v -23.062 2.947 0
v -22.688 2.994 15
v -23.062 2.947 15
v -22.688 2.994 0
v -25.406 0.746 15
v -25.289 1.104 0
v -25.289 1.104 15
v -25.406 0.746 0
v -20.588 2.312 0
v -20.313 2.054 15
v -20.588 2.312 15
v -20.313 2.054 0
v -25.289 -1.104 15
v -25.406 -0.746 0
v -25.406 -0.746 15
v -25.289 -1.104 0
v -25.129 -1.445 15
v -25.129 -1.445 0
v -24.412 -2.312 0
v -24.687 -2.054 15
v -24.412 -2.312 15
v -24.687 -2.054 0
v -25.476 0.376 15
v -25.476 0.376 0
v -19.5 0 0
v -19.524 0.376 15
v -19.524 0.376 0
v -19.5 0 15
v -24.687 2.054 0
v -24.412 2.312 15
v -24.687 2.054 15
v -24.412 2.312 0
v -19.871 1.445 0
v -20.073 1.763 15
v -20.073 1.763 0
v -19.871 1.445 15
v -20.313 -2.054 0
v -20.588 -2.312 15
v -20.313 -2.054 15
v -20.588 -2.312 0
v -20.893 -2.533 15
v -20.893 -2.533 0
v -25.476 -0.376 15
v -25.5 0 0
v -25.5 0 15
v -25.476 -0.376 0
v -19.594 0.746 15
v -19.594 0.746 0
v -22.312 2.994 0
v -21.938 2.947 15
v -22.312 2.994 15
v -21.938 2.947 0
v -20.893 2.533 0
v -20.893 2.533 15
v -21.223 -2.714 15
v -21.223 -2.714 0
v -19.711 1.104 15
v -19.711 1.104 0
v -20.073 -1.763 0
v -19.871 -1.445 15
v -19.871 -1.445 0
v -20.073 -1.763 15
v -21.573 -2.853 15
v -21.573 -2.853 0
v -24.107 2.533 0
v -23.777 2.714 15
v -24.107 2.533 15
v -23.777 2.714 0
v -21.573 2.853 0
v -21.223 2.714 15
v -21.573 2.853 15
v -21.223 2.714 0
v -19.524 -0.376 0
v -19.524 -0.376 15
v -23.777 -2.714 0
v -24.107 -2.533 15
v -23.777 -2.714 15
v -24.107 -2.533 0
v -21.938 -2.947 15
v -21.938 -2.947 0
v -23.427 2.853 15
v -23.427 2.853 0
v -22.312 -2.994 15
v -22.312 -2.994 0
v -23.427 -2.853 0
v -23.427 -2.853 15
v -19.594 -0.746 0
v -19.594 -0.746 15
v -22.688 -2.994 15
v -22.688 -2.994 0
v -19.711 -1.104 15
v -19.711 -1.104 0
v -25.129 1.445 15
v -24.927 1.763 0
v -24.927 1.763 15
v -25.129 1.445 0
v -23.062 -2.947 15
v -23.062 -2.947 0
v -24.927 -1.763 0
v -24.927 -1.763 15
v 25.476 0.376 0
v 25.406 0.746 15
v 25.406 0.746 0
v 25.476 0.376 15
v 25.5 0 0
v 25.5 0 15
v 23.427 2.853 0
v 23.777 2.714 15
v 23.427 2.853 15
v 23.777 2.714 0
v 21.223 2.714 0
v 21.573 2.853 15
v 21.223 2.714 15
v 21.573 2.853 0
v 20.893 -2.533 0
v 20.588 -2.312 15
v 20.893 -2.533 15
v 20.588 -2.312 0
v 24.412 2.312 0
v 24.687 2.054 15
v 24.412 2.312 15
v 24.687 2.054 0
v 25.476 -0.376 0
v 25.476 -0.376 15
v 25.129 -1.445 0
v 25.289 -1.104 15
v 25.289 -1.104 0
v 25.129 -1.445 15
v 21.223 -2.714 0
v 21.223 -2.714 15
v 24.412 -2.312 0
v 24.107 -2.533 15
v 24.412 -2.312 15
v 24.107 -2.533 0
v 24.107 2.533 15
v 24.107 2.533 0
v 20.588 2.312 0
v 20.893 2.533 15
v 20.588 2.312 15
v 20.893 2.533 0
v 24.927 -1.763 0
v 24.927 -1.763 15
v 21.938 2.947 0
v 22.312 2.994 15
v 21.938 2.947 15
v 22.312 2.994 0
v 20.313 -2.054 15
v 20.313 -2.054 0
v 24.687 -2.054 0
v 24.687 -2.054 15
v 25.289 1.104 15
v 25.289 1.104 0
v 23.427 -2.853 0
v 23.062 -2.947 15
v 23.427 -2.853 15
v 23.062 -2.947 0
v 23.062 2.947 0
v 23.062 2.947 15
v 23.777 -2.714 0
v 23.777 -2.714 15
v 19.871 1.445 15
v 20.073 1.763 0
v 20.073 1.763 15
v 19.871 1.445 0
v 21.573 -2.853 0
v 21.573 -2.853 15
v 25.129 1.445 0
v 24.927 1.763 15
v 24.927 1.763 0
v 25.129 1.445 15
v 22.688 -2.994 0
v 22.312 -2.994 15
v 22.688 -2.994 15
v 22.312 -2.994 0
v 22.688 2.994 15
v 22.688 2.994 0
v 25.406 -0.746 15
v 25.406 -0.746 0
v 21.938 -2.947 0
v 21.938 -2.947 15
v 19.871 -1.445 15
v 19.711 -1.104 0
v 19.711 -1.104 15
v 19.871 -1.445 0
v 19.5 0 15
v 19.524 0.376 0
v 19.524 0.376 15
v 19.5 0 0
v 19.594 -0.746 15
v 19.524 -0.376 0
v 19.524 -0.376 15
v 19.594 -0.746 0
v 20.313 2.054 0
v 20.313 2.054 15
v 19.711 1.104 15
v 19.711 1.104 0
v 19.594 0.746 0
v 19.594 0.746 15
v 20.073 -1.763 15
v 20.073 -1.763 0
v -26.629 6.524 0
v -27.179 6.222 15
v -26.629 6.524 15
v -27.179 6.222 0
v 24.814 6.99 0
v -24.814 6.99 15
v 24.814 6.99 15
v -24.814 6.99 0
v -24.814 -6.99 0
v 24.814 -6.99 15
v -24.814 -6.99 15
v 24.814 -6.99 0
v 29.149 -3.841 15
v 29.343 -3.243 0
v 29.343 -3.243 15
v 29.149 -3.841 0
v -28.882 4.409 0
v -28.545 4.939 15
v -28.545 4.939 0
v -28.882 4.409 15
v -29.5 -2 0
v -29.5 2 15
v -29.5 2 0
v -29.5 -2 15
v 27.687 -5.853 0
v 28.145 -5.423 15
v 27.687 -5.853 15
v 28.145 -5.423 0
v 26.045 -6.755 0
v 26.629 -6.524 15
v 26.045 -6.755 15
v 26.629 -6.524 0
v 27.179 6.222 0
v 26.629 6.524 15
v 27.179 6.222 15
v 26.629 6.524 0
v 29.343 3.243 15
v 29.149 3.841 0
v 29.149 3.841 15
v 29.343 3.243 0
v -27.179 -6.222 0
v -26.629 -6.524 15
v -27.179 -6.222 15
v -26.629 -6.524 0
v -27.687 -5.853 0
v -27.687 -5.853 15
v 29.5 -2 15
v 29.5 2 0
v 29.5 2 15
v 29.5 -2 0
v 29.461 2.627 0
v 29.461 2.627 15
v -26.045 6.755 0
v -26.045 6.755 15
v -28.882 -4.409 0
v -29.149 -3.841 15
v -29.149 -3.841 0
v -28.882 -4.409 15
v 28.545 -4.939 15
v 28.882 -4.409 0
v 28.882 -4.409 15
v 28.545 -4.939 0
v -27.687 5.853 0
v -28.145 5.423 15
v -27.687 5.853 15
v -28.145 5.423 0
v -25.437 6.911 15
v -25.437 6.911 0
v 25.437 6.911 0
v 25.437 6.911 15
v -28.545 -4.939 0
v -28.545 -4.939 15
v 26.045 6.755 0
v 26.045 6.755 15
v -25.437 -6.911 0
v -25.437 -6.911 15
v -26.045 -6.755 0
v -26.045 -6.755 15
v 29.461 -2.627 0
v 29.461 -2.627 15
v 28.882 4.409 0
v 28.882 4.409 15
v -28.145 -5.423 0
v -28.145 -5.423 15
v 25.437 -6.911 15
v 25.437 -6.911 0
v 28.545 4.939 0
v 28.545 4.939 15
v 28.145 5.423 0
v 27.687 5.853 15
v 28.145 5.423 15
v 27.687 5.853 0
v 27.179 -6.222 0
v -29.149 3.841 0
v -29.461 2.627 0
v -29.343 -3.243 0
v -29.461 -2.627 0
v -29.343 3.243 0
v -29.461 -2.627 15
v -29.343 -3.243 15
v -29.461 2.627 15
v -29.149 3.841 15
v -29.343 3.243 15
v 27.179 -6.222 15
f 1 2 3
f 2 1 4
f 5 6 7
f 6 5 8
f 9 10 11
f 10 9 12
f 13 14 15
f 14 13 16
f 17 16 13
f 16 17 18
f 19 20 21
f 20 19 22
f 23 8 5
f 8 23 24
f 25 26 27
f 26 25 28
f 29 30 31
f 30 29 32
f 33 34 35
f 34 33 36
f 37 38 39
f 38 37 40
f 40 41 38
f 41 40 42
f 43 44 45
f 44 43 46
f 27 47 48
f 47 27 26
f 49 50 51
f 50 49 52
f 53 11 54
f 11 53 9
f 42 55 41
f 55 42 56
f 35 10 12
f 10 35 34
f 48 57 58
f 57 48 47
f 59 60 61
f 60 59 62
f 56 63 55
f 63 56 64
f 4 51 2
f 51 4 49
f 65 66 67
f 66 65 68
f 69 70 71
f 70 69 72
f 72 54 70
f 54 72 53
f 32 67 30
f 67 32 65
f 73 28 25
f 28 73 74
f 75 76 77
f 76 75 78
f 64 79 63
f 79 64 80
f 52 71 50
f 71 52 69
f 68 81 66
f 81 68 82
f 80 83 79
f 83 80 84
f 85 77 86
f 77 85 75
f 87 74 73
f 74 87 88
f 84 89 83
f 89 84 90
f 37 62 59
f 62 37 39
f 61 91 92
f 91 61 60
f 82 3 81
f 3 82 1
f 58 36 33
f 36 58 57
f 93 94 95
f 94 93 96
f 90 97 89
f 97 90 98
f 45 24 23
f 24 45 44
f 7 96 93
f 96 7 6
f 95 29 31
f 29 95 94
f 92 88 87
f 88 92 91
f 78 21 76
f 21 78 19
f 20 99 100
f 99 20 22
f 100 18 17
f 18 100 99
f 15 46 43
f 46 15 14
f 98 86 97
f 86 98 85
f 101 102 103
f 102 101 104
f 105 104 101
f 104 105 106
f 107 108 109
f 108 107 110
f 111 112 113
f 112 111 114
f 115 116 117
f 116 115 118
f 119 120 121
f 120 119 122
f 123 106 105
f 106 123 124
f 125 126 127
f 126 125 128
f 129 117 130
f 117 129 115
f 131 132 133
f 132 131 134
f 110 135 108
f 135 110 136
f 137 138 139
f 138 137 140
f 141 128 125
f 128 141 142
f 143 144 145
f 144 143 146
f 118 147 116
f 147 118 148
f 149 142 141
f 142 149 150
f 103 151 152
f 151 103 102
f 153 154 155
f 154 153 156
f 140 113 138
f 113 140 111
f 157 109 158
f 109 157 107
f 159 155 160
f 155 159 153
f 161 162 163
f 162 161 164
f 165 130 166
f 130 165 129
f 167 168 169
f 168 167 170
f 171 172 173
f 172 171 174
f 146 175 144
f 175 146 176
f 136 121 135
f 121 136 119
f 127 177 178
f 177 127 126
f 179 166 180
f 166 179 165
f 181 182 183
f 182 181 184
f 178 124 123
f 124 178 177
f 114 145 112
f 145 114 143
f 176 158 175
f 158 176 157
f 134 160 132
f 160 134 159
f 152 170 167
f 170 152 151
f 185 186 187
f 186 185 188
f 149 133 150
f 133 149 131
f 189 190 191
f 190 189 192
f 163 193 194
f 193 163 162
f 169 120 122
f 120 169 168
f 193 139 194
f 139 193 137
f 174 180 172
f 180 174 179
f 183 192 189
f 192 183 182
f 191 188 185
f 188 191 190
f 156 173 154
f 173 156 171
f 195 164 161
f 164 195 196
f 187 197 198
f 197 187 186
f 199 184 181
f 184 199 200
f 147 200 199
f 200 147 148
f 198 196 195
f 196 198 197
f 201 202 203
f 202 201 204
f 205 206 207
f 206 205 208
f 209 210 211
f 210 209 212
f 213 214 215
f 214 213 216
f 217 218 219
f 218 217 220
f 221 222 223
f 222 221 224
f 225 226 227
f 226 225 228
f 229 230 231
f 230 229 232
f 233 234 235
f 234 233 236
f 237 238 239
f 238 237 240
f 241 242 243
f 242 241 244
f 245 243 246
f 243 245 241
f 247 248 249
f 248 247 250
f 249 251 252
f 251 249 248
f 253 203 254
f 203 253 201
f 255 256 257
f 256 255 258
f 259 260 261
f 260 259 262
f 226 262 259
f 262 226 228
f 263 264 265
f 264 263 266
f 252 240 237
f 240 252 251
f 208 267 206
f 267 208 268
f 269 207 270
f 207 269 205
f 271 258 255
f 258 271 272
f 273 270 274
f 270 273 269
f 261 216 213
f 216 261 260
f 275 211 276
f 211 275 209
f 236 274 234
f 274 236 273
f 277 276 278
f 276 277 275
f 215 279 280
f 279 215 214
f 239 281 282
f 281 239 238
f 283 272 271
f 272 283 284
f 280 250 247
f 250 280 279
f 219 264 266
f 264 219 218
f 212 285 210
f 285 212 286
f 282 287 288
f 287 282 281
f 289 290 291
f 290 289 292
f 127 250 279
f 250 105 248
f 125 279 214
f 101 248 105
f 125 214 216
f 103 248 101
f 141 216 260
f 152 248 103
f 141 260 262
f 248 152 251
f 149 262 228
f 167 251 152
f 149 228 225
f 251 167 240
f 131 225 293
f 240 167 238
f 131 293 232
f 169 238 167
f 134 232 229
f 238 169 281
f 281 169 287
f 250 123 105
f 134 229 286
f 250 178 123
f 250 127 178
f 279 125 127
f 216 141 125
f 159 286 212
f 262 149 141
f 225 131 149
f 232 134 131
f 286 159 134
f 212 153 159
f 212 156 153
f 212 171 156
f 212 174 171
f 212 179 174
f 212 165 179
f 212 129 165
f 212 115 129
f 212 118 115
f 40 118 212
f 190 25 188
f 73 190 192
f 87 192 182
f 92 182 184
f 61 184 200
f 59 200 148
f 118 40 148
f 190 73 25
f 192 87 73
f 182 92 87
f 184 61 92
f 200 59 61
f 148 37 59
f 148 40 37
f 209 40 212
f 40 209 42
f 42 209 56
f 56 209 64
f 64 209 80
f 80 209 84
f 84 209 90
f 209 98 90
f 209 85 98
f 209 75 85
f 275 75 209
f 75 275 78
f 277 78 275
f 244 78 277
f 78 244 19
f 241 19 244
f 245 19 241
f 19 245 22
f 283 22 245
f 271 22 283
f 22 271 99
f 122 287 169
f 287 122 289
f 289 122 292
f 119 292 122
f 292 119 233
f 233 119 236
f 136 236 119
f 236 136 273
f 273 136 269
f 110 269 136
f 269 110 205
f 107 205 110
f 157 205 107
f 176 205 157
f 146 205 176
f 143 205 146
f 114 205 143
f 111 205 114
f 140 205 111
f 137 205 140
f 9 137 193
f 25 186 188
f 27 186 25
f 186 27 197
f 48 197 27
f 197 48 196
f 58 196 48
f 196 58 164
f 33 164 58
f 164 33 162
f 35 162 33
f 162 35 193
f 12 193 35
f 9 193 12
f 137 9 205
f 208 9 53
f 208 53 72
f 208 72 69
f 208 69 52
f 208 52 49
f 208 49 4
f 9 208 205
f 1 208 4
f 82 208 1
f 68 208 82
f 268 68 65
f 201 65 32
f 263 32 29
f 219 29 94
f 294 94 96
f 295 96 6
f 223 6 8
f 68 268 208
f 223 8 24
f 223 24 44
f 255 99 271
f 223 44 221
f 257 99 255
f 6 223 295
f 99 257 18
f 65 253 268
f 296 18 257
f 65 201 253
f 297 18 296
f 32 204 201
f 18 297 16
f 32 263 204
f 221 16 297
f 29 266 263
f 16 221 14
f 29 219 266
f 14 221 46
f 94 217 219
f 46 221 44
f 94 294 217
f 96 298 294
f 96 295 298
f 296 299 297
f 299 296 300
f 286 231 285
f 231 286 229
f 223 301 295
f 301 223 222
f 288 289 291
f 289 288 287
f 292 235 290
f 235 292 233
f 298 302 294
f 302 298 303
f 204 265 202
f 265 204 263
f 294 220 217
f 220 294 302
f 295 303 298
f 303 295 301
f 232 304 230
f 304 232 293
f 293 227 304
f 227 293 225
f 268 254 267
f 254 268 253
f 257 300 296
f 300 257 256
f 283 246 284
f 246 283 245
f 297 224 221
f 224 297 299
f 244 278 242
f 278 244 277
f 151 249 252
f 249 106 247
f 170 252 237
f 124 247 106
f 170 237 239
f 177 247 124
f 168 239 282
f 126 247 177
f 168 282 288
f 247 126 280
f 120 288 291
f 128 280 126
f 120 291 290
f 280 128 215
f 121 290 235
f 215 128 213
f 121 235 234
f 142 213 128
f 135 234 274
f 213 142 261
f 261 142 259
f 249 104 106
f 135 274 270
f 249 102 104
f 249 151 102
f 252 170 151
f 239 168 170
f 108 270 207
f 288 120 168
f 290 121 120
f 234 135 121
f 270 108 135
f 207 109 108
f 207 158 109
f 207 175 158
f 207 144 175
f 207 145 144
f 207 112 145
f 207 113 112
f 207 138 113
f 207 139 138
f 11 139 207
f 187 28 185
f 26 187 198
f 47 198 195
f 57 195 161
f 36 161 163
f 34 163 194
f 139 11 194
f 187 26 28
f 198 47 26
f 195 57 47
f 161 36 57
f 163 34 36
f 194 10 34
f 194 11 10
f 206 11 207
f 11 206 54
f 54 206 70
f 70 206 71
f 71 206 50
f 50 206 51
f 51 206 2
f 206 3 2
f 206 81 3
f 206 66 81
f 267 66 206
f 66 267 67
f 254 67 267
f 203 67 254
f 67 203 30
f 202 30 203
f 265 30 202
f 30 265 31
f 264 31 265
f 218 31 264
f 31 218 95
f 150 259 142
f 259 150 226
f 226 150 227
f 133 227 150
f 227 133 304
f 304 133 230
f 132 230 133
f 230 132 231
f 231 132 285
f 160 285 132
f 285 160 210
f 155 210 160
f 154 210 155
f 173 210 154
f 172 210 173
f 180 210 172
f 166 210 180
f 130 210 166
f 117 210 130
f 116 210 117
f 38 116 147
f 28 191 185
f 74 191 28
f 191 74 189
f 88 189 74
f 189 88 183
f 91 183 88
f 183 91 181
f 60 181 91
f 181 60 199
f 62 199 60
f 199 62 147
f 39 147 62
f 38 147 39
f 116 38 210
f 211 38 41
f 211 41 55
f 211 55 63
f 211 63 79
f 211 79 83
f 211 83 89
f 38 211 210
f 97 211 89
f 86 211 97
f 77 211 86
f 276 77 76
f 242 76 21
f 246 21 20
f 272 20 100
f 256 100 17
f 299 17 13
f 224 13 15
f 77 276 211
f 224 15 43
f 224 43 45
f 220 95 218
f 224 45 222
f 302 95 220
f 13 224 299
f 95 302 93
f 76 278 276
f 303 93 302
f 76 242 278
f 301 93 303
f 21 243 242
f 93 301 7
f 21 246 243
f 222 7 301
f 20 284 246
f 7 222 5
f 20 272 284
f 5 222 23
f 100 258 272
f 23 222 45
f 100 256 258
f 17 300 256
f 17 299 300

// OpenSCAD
$fn = 50;


difference() {
	union() {
		hull() {
			translate(v = [-24.5000000000, 2.0000000000, 0]) {
				cylinder(h = 15, r = 5);
			}
			translate(v = [24.5000000000, 2.0000000000, 0]) {
				cylinder(h = 15, r = 5);
			}
			translate(v = [-24.5000000000, -2.0000000000, 0]) {
				cylinder(h = 15, r = 5);
			}
			translate(v = [24.5000000000, -2.0000000000, 0]) {
				cylinder(h = 15, r = 5);
			}
		}
	}
	union() {
		translate(v = [-22.5000000000, 0.0000000000, -100.0000000000]) {
			cylinder(h = 200, r = 3.0000000000);
		}
		translate(v = [-22.5000000000, 0.0000000000, -100.0000000000]) {
			cylinder(h = 200, r = 3.0000000000);
		}
		translate(v = [22.5000000000, 0.0000000000, -100.0000000000]) {
			cylinder(h = 200, r = 3.0000000000);
		}
		translate(v = [22.5000000000, 0.0000000000, -100.0000000000]) {
			cylinder(h = 200, r = 3.0000000000);
		}
	}
}
